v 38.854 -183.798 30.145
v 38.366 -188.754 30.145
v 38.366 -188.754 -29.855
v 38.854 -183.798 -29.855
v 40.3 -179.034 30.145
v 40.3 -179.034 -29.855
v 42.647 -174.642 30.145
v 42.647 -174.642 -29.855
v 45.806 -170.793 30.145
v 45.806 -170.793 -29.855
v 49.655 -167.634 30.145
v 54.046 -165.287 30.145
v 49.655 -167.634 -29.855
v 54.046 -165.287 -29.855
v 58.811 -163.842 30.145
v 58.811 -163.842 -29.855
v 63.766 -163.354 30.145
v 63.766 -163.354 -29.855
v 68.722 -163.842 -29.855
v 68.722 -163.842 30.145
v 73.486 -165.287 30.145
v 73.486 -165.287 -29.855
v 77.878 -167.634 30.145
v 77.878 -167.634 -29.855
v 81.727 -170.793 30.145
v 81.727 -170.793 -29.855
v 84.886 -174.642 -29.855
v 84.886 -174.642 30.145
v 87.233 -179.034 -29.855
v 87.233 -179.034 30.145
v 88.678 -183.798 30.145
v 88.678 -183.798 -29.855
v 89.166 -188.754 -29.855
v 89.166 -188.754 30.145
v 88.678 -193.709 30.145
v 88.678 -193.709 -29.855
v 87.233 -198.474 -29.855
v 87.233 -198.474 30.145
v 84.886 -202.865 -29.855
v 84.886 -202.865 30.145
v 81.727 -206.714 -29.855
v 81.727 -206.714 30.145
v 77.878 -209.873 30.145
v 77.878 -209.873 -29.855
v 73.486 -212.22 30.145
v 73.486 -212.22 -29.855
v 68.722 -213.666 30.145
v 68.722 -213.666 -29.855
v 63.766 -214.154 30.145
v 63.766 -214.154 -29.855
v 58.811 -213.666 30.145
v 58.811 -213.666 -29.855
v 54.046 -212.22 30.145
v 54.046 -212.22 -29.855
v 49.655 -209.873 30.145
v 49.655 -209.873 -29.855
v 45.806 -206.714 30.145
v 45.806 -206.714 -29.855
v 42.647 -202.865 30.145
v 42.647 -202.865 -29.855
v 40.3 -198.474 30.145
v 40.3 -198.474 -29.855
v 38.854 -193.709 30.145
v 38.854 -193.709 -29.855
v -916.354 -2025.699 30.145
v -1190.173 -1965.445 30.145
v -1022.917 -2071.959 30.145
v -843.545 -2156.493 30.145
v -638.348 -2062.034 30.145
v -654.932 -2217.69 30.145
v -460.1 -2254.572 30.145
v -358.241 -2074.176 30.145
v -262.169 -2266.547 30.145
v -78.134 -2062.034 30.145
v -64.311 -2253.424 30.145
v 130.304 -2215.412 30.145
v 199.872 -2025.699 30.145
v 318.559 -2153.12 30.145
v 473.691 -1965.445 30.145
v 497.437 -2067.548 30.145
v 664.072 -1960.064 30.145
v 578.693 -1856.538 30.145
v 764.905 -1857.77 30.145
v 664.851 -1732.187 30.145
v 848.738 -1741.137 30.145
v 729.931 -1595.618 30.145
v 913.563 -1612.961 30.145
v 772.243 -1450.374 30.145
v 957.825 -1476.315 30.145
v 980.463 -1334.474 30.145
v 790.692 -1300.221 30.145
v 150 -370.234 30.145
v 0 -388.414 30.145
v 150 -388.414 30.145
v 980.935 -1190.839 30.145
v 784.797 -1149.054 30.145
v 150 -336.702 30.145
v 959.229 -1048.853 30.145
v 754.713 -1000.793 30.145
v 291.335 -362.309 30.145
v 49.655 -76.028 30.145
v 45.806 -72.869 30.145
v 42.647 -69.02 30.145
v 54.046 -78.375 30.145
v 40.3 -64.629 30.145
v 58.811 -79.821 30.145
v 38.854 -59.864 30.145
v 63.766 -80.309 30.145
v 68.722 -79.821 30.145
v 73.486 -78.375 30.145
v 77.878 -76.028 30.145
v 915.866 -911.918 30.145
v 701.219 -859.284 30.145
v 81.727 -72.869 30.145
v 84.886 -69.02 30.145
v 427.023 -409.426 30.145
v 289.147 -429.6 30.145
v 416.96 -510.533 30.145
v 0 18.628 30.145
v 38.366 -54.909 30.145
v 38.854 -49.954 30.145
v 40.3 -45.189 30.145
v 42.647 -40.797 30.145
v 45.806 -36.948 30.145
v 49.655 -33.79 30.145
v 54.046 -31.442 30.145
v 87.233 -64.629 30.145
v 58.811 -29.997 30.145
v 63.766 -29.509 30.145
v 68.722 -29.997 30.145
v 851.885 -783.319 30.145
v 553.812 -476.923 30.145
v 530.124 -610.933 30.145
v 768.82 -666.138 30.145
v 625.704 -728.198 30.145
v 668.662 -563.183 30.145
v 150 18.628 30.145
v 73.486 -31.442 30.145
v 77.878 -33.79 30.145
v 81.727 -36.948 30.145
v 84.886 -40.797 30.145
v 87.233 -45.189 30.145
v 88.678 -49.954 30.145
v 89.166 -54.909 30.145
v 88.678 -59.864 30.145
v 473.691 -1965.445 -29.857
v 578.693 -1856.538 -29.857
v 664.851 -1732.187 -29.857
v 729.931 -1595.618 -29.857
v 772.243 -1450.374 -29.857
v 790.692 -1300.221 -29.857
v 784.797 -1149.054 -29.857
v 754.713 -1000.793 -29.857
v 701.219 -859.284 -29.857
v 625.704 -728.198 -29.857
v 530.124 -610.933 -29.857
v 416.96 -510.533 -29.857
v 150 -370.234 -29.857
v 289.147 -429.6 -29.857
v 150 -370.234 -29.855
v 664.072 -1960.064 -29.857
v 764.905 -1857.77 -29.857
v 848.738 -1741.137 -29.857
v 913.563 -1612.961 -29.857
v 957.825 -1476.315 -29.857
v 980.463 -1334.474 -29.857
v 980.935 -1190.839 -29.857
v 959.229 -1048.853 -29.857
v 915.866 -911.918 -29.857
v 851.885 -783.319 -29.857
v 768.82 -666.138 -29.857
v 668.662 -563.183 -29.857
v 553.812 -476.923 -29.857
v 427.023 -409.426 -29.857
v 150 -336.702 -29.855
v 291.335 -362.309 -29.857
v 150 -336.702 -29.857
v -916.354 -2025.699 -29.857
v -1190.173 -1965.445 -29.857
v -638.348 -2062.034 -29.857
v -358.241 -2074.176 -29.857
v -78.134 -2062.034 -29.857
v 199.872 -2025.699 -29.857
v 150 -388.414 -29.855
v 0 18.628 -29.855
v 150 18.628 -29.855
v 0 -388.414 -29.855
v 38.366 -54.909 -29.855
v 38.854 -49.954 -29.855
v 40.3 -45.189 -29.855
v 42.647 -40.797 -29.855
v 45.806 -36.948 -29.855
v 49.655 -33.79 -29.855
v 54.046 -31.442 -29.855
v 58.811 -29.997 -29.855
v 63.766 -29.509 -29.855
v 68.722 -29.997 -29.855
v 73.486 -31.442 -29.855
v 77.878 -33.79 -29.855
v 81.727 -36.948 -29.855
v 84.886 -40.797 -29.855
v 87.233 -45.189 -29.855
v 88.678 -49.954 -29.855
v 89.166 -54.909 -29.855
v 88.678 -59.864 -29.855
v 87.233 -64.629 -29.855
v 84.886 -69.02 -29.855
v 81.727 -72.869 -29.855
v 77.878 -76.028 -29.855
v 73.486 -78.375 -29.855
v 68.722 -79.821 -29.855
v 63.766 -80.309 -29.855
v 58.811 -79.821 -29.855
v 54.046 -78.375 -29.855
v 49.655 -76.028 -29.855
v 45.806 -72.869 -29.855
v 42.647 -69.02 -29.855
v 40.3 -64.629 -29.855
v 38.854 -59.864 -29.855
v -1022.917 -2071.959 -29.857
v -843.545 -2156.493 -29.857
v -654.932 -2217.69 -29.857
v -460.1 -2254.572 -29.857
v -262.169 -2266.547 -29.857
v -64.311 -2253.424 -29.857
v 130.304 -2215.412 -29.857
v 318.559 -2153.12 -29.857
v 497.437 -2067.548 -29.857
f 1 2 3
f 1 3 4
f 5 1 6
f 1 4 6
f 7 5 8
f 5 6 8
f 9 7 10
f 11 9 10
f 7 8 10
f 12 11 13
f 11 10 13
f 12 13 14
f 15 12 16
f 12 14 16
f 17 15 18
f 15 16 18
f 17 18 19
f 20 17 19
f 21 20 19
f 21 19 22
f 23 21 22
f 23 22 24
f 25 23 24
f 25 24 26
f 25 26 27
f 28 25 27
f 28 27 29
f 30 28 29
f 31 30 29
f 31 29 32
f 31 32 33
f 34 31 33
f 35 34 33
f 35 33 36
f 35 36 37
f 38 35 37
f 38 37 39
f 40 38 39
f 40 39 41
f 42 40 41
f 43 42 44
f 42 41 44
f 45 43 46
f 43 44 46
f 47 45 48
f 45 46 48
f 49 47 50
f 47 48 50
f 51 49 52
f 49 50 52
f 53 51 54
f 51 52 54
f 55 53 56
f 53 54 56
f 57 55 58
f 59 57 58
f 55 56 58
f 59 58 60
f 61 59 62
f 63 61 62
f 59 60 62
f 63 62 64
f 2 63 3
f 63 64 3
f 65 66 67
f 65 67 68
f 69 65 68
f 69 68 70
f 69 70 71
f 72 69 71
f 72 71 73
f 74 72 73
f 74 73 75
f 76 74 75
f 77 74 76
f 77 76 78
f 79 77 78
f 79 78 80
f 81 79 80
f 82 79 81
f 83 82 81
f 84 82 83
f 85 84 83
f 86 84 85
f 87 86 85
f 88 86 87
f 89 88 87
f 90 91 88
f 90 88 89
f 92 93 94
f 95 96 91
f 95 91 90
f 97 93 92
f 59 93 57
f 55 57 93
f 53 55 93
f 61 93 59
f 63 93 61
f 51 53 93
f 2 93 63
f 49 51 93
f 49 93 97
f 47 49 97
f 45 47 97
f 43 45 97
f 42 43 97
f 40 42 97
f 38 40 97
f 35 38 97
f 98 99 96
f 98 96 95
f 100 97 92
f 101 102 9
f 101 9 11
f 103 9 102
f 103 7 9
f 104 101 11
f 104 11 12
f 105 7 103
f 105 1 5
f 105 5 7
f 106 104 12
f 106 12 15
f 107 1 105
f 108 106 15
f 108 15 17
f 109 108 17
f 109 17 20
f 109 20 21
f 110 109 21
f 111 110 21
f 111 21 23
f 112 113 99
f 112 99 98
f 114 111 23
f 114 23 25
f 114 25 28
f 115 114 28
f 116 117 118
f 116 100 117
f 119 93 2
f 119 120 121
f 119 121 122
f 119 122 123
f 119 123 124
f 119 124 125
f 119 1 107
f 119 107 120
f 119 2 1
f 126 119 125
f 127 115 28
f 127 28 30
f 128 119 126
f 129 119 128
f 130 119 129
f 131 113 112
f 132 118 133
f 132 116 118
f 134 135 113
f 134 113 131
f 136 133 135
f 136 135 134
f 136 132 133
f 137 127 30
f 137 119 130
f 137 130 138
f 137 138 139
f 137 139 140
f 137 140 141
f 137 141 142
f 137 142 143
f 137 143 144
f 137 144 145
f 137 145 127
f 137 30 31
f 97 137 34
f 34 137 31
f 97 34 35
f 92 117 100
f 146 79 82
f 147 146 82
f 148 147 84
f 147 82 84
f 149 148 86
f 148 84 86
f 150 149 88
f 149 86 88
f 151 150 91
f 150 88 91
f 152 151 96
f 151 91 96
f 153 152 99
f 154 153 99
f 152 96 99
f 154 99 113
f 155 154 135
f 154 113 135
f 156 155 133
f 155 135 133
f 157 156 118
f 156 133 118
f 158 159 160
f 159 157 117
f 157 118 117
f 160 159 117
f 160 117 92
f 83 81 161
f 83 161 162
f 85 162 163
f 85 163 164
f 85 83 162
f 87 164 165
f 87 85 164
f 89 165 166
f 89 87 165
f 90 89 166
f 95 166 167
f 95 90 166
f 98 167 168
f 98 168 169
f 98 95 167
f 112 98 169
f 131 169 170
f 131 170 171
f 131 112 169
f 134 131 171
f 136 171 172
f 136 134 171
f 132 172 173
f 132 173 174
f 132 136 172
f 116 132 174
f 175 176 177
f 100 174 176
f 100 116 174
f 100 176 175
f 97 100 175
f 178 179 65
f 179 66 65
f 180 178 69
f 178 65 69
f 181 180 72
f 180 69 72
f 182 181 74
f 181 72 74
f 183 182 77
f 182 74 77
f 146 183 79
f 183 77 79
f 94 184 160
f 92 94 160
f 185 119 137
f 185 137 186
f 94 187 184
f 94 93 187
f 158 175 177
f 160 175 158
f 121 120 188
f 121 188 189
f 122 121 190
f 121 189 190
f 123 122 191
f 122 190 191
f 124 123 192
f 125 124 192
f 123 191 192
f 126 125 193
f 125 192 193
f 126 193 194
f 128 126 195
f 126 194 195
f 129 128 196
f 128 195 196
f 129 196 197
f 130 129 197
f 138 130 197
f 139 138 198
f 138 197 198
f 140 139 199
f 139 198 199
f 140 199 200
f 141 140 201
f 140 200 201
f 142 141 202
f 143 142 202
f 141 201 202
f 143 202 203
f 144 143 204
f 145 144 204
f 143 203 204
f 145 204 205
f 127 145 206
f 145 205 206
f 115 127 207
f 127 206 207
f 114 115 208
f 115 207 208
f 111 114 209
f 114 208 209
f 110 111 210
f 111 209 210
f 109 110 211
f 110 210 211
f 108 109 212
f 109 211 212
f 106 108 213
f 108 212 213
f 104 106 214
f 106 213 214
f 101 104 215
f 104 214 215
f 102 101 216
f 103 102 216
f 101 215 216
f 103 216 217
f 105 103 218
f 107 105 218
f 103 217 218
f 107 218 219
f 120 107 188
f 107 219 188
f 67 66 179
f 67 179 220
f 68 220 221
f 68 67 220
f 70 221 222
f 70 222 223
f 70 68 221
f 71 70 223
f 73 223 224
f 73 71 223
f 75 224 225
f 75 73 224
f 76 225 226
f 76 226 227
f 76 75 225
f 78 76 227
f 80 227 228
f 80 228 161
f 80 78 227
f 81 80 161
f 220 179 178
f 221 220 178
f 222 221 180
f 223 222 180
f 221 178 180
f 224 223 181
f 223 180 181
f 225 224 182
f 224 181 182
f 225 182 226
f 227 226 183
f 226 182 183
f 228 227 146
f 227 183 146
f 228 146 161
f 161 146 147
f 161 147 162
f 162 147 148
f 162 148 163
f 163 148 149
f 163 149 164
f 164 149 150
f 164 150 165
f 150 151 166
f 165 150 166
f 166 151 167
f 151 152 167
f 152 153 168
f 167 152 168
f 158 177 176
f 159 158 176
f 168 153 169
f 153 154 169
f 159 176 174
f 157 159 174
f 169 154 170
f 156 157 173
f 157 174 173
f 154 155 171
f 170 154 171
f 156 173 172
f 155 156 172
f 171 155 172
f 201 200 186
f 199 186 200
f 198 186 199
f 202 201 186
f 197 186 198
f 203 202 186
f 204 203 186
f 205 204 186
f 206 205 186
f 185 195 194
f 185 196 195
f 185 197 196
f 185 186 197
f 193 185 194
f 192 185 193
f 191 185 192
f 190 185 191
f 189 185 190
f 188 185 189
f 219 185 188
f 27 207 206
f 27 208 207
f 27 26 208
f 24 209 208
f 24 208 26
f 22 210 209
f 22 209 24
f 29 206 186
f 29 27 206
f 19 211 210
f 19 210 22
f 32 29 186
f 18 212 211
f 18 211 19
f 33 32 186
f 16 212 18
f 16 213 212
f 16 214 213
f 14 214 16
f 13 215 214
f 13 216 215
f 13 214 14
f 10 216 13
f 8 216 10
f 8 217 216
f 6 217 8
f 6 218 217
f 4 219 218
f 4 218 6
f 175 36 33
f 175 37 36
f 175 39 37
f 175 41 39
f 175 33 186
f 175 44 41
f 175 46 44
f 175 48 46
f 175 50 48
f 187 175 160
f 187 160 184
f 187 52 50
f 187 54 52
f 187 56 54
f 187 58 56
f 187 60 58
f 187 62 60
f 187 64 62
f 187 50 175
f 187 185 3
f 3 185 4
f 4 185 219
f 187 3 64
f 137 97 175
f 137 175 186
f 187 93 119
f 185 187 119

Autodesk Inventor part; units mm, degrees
ref_plane "YZ Plane" through (0, 0, 0) normal (1, 0, 0) x (0, 1, 0)
ref_plane "XZ Plane" through (0, 0, 0) normal (0, 1, 0) x (-1, 0, 0)
ref_plane "XY Plane" through (0, 0, 0) normal (0, 0, 1) x (1, 0, 0)
sketch "Sketch1" plane through (0, 0, 0) normal (1, 0, 0) x (0, 1, 0)
  line L0 (18.6276, 30.145) -> (-681.3735, 30.145)
  line L1 (18.6276, 30.145) -> (18.6276, -29.8549)
  line L2 (18.6276, -29.8549) -> (-681.3735, -29.8549)
  line L3 (-681.3735, 30.145) -> (-1317.975, 30.145)
  line L4 (-1317.975, 30.145) -> (-1300.7166, -29.8549)
  line L5 (-1300.7166, -29.8549) -> (-681.3735, -29.8549)
  point P0 (0, 0)
  dimension "d0" = 700.0011
  dimension "d1" = 59.9999
extrude "Extrusion1" add sketch "Sketch1" along normal blind 150
sketch "Sketch2" plane through (0, 18.6276, 30.145) normal (0, 1, 0) x (1, 0, 0)
  line L0 (30.0948, 48.0392) -> (130.9532, 48.0392) construction
  line L1 (130.9532, 48.0392) -> (130.9532, 12.2508) construction
  line L2 (130.9532, 12.2508) -> (30.0948, 12.2508) construction
  line L3 (30.0948, 12.2508) -> (30.0948, 48.0392) construction
  point P0 (0, 30.145)
fillet "Fillet1" [suppressed]
chamfer "Chamfer1" [suppressed]
sketch "Sketch3" plane through (150, 18.6276, -29.8549) normal (0, 0, -1) x (-1, 0, 0)
  circle A0 centre (86.2337, -73.5365) radius 25.4
  circle A1 centre (86.2337, -207.3813) radius 25.4
  point P0 (150, -18.6276)
  dimension "d8" = 50.8
  dimension "d9" = 50.8
extrude "Extrusion2" cut sketch "Sketch3" against normal blind 150
fillet "Fillet2" radius 203.2 1 edges at (150, -1309.3458, 0.1451)
sketch "Sketch4" plane through (0, 18.6276, 30.145) normal (0, 0, 1) x (1, 0, 0)
  line L0 (0, 0) -> (0, -1336.6026) projected
  line L1 (0, -407.0419) -> (196.678, -407.0419)
  line L2 (196.678, -407.0419) -> (196.678, -1363.7468)
  line L3 (196.678, -1363.7468) -> (0, -1363.7468)
  line L4 (0, -1363.7468) -> (0, -407.0419)
  point P0 (0, -18.6276)
extrude "Extrusion3" cut sketch "Sketch4" against normal blind 76.2
sketch "Sketch5" plane through (0, 18.6276, 30.145) normal (0, 0, 1) x (1, 0, 0)
  arc A0 (657.8206, -1984.0725) -> (111.0415, -352.1801) centre (55.7755, -1278.2451) ccw
  arc A1 (-1190.1731, -1984.0725) -> (664.0722, -1978.692) centre (-266.7148, -718.5694) ccw
  arc A2 (473.6908, -1984.0725) -> (0.5095, -352.1801) centre (-147.8493, -1279.7458) ccw
  arc A3 (-1190.1731, -1984.0725) -> (473.6908, -1984.0725) centre (-358.2411, 1144.2439) ccw
  line L0 (0.5095, -352.1801) -> (111.0415, -352.1801)
  line L1 (150, -407.0419) -> (150, 0) projected
  line L2 (150, 0) -> (150, -407.0419) projected
  line L3 (150, -355.3299) -> (150, -388.8618)
  point P0 (0, -18.6276)
extrude "Extrusion4" add sketch "Sketch5" against normal blind 60.0024 contours A1 A3 A2 L1 A0
properties part number "legplate" material "CFRP"
